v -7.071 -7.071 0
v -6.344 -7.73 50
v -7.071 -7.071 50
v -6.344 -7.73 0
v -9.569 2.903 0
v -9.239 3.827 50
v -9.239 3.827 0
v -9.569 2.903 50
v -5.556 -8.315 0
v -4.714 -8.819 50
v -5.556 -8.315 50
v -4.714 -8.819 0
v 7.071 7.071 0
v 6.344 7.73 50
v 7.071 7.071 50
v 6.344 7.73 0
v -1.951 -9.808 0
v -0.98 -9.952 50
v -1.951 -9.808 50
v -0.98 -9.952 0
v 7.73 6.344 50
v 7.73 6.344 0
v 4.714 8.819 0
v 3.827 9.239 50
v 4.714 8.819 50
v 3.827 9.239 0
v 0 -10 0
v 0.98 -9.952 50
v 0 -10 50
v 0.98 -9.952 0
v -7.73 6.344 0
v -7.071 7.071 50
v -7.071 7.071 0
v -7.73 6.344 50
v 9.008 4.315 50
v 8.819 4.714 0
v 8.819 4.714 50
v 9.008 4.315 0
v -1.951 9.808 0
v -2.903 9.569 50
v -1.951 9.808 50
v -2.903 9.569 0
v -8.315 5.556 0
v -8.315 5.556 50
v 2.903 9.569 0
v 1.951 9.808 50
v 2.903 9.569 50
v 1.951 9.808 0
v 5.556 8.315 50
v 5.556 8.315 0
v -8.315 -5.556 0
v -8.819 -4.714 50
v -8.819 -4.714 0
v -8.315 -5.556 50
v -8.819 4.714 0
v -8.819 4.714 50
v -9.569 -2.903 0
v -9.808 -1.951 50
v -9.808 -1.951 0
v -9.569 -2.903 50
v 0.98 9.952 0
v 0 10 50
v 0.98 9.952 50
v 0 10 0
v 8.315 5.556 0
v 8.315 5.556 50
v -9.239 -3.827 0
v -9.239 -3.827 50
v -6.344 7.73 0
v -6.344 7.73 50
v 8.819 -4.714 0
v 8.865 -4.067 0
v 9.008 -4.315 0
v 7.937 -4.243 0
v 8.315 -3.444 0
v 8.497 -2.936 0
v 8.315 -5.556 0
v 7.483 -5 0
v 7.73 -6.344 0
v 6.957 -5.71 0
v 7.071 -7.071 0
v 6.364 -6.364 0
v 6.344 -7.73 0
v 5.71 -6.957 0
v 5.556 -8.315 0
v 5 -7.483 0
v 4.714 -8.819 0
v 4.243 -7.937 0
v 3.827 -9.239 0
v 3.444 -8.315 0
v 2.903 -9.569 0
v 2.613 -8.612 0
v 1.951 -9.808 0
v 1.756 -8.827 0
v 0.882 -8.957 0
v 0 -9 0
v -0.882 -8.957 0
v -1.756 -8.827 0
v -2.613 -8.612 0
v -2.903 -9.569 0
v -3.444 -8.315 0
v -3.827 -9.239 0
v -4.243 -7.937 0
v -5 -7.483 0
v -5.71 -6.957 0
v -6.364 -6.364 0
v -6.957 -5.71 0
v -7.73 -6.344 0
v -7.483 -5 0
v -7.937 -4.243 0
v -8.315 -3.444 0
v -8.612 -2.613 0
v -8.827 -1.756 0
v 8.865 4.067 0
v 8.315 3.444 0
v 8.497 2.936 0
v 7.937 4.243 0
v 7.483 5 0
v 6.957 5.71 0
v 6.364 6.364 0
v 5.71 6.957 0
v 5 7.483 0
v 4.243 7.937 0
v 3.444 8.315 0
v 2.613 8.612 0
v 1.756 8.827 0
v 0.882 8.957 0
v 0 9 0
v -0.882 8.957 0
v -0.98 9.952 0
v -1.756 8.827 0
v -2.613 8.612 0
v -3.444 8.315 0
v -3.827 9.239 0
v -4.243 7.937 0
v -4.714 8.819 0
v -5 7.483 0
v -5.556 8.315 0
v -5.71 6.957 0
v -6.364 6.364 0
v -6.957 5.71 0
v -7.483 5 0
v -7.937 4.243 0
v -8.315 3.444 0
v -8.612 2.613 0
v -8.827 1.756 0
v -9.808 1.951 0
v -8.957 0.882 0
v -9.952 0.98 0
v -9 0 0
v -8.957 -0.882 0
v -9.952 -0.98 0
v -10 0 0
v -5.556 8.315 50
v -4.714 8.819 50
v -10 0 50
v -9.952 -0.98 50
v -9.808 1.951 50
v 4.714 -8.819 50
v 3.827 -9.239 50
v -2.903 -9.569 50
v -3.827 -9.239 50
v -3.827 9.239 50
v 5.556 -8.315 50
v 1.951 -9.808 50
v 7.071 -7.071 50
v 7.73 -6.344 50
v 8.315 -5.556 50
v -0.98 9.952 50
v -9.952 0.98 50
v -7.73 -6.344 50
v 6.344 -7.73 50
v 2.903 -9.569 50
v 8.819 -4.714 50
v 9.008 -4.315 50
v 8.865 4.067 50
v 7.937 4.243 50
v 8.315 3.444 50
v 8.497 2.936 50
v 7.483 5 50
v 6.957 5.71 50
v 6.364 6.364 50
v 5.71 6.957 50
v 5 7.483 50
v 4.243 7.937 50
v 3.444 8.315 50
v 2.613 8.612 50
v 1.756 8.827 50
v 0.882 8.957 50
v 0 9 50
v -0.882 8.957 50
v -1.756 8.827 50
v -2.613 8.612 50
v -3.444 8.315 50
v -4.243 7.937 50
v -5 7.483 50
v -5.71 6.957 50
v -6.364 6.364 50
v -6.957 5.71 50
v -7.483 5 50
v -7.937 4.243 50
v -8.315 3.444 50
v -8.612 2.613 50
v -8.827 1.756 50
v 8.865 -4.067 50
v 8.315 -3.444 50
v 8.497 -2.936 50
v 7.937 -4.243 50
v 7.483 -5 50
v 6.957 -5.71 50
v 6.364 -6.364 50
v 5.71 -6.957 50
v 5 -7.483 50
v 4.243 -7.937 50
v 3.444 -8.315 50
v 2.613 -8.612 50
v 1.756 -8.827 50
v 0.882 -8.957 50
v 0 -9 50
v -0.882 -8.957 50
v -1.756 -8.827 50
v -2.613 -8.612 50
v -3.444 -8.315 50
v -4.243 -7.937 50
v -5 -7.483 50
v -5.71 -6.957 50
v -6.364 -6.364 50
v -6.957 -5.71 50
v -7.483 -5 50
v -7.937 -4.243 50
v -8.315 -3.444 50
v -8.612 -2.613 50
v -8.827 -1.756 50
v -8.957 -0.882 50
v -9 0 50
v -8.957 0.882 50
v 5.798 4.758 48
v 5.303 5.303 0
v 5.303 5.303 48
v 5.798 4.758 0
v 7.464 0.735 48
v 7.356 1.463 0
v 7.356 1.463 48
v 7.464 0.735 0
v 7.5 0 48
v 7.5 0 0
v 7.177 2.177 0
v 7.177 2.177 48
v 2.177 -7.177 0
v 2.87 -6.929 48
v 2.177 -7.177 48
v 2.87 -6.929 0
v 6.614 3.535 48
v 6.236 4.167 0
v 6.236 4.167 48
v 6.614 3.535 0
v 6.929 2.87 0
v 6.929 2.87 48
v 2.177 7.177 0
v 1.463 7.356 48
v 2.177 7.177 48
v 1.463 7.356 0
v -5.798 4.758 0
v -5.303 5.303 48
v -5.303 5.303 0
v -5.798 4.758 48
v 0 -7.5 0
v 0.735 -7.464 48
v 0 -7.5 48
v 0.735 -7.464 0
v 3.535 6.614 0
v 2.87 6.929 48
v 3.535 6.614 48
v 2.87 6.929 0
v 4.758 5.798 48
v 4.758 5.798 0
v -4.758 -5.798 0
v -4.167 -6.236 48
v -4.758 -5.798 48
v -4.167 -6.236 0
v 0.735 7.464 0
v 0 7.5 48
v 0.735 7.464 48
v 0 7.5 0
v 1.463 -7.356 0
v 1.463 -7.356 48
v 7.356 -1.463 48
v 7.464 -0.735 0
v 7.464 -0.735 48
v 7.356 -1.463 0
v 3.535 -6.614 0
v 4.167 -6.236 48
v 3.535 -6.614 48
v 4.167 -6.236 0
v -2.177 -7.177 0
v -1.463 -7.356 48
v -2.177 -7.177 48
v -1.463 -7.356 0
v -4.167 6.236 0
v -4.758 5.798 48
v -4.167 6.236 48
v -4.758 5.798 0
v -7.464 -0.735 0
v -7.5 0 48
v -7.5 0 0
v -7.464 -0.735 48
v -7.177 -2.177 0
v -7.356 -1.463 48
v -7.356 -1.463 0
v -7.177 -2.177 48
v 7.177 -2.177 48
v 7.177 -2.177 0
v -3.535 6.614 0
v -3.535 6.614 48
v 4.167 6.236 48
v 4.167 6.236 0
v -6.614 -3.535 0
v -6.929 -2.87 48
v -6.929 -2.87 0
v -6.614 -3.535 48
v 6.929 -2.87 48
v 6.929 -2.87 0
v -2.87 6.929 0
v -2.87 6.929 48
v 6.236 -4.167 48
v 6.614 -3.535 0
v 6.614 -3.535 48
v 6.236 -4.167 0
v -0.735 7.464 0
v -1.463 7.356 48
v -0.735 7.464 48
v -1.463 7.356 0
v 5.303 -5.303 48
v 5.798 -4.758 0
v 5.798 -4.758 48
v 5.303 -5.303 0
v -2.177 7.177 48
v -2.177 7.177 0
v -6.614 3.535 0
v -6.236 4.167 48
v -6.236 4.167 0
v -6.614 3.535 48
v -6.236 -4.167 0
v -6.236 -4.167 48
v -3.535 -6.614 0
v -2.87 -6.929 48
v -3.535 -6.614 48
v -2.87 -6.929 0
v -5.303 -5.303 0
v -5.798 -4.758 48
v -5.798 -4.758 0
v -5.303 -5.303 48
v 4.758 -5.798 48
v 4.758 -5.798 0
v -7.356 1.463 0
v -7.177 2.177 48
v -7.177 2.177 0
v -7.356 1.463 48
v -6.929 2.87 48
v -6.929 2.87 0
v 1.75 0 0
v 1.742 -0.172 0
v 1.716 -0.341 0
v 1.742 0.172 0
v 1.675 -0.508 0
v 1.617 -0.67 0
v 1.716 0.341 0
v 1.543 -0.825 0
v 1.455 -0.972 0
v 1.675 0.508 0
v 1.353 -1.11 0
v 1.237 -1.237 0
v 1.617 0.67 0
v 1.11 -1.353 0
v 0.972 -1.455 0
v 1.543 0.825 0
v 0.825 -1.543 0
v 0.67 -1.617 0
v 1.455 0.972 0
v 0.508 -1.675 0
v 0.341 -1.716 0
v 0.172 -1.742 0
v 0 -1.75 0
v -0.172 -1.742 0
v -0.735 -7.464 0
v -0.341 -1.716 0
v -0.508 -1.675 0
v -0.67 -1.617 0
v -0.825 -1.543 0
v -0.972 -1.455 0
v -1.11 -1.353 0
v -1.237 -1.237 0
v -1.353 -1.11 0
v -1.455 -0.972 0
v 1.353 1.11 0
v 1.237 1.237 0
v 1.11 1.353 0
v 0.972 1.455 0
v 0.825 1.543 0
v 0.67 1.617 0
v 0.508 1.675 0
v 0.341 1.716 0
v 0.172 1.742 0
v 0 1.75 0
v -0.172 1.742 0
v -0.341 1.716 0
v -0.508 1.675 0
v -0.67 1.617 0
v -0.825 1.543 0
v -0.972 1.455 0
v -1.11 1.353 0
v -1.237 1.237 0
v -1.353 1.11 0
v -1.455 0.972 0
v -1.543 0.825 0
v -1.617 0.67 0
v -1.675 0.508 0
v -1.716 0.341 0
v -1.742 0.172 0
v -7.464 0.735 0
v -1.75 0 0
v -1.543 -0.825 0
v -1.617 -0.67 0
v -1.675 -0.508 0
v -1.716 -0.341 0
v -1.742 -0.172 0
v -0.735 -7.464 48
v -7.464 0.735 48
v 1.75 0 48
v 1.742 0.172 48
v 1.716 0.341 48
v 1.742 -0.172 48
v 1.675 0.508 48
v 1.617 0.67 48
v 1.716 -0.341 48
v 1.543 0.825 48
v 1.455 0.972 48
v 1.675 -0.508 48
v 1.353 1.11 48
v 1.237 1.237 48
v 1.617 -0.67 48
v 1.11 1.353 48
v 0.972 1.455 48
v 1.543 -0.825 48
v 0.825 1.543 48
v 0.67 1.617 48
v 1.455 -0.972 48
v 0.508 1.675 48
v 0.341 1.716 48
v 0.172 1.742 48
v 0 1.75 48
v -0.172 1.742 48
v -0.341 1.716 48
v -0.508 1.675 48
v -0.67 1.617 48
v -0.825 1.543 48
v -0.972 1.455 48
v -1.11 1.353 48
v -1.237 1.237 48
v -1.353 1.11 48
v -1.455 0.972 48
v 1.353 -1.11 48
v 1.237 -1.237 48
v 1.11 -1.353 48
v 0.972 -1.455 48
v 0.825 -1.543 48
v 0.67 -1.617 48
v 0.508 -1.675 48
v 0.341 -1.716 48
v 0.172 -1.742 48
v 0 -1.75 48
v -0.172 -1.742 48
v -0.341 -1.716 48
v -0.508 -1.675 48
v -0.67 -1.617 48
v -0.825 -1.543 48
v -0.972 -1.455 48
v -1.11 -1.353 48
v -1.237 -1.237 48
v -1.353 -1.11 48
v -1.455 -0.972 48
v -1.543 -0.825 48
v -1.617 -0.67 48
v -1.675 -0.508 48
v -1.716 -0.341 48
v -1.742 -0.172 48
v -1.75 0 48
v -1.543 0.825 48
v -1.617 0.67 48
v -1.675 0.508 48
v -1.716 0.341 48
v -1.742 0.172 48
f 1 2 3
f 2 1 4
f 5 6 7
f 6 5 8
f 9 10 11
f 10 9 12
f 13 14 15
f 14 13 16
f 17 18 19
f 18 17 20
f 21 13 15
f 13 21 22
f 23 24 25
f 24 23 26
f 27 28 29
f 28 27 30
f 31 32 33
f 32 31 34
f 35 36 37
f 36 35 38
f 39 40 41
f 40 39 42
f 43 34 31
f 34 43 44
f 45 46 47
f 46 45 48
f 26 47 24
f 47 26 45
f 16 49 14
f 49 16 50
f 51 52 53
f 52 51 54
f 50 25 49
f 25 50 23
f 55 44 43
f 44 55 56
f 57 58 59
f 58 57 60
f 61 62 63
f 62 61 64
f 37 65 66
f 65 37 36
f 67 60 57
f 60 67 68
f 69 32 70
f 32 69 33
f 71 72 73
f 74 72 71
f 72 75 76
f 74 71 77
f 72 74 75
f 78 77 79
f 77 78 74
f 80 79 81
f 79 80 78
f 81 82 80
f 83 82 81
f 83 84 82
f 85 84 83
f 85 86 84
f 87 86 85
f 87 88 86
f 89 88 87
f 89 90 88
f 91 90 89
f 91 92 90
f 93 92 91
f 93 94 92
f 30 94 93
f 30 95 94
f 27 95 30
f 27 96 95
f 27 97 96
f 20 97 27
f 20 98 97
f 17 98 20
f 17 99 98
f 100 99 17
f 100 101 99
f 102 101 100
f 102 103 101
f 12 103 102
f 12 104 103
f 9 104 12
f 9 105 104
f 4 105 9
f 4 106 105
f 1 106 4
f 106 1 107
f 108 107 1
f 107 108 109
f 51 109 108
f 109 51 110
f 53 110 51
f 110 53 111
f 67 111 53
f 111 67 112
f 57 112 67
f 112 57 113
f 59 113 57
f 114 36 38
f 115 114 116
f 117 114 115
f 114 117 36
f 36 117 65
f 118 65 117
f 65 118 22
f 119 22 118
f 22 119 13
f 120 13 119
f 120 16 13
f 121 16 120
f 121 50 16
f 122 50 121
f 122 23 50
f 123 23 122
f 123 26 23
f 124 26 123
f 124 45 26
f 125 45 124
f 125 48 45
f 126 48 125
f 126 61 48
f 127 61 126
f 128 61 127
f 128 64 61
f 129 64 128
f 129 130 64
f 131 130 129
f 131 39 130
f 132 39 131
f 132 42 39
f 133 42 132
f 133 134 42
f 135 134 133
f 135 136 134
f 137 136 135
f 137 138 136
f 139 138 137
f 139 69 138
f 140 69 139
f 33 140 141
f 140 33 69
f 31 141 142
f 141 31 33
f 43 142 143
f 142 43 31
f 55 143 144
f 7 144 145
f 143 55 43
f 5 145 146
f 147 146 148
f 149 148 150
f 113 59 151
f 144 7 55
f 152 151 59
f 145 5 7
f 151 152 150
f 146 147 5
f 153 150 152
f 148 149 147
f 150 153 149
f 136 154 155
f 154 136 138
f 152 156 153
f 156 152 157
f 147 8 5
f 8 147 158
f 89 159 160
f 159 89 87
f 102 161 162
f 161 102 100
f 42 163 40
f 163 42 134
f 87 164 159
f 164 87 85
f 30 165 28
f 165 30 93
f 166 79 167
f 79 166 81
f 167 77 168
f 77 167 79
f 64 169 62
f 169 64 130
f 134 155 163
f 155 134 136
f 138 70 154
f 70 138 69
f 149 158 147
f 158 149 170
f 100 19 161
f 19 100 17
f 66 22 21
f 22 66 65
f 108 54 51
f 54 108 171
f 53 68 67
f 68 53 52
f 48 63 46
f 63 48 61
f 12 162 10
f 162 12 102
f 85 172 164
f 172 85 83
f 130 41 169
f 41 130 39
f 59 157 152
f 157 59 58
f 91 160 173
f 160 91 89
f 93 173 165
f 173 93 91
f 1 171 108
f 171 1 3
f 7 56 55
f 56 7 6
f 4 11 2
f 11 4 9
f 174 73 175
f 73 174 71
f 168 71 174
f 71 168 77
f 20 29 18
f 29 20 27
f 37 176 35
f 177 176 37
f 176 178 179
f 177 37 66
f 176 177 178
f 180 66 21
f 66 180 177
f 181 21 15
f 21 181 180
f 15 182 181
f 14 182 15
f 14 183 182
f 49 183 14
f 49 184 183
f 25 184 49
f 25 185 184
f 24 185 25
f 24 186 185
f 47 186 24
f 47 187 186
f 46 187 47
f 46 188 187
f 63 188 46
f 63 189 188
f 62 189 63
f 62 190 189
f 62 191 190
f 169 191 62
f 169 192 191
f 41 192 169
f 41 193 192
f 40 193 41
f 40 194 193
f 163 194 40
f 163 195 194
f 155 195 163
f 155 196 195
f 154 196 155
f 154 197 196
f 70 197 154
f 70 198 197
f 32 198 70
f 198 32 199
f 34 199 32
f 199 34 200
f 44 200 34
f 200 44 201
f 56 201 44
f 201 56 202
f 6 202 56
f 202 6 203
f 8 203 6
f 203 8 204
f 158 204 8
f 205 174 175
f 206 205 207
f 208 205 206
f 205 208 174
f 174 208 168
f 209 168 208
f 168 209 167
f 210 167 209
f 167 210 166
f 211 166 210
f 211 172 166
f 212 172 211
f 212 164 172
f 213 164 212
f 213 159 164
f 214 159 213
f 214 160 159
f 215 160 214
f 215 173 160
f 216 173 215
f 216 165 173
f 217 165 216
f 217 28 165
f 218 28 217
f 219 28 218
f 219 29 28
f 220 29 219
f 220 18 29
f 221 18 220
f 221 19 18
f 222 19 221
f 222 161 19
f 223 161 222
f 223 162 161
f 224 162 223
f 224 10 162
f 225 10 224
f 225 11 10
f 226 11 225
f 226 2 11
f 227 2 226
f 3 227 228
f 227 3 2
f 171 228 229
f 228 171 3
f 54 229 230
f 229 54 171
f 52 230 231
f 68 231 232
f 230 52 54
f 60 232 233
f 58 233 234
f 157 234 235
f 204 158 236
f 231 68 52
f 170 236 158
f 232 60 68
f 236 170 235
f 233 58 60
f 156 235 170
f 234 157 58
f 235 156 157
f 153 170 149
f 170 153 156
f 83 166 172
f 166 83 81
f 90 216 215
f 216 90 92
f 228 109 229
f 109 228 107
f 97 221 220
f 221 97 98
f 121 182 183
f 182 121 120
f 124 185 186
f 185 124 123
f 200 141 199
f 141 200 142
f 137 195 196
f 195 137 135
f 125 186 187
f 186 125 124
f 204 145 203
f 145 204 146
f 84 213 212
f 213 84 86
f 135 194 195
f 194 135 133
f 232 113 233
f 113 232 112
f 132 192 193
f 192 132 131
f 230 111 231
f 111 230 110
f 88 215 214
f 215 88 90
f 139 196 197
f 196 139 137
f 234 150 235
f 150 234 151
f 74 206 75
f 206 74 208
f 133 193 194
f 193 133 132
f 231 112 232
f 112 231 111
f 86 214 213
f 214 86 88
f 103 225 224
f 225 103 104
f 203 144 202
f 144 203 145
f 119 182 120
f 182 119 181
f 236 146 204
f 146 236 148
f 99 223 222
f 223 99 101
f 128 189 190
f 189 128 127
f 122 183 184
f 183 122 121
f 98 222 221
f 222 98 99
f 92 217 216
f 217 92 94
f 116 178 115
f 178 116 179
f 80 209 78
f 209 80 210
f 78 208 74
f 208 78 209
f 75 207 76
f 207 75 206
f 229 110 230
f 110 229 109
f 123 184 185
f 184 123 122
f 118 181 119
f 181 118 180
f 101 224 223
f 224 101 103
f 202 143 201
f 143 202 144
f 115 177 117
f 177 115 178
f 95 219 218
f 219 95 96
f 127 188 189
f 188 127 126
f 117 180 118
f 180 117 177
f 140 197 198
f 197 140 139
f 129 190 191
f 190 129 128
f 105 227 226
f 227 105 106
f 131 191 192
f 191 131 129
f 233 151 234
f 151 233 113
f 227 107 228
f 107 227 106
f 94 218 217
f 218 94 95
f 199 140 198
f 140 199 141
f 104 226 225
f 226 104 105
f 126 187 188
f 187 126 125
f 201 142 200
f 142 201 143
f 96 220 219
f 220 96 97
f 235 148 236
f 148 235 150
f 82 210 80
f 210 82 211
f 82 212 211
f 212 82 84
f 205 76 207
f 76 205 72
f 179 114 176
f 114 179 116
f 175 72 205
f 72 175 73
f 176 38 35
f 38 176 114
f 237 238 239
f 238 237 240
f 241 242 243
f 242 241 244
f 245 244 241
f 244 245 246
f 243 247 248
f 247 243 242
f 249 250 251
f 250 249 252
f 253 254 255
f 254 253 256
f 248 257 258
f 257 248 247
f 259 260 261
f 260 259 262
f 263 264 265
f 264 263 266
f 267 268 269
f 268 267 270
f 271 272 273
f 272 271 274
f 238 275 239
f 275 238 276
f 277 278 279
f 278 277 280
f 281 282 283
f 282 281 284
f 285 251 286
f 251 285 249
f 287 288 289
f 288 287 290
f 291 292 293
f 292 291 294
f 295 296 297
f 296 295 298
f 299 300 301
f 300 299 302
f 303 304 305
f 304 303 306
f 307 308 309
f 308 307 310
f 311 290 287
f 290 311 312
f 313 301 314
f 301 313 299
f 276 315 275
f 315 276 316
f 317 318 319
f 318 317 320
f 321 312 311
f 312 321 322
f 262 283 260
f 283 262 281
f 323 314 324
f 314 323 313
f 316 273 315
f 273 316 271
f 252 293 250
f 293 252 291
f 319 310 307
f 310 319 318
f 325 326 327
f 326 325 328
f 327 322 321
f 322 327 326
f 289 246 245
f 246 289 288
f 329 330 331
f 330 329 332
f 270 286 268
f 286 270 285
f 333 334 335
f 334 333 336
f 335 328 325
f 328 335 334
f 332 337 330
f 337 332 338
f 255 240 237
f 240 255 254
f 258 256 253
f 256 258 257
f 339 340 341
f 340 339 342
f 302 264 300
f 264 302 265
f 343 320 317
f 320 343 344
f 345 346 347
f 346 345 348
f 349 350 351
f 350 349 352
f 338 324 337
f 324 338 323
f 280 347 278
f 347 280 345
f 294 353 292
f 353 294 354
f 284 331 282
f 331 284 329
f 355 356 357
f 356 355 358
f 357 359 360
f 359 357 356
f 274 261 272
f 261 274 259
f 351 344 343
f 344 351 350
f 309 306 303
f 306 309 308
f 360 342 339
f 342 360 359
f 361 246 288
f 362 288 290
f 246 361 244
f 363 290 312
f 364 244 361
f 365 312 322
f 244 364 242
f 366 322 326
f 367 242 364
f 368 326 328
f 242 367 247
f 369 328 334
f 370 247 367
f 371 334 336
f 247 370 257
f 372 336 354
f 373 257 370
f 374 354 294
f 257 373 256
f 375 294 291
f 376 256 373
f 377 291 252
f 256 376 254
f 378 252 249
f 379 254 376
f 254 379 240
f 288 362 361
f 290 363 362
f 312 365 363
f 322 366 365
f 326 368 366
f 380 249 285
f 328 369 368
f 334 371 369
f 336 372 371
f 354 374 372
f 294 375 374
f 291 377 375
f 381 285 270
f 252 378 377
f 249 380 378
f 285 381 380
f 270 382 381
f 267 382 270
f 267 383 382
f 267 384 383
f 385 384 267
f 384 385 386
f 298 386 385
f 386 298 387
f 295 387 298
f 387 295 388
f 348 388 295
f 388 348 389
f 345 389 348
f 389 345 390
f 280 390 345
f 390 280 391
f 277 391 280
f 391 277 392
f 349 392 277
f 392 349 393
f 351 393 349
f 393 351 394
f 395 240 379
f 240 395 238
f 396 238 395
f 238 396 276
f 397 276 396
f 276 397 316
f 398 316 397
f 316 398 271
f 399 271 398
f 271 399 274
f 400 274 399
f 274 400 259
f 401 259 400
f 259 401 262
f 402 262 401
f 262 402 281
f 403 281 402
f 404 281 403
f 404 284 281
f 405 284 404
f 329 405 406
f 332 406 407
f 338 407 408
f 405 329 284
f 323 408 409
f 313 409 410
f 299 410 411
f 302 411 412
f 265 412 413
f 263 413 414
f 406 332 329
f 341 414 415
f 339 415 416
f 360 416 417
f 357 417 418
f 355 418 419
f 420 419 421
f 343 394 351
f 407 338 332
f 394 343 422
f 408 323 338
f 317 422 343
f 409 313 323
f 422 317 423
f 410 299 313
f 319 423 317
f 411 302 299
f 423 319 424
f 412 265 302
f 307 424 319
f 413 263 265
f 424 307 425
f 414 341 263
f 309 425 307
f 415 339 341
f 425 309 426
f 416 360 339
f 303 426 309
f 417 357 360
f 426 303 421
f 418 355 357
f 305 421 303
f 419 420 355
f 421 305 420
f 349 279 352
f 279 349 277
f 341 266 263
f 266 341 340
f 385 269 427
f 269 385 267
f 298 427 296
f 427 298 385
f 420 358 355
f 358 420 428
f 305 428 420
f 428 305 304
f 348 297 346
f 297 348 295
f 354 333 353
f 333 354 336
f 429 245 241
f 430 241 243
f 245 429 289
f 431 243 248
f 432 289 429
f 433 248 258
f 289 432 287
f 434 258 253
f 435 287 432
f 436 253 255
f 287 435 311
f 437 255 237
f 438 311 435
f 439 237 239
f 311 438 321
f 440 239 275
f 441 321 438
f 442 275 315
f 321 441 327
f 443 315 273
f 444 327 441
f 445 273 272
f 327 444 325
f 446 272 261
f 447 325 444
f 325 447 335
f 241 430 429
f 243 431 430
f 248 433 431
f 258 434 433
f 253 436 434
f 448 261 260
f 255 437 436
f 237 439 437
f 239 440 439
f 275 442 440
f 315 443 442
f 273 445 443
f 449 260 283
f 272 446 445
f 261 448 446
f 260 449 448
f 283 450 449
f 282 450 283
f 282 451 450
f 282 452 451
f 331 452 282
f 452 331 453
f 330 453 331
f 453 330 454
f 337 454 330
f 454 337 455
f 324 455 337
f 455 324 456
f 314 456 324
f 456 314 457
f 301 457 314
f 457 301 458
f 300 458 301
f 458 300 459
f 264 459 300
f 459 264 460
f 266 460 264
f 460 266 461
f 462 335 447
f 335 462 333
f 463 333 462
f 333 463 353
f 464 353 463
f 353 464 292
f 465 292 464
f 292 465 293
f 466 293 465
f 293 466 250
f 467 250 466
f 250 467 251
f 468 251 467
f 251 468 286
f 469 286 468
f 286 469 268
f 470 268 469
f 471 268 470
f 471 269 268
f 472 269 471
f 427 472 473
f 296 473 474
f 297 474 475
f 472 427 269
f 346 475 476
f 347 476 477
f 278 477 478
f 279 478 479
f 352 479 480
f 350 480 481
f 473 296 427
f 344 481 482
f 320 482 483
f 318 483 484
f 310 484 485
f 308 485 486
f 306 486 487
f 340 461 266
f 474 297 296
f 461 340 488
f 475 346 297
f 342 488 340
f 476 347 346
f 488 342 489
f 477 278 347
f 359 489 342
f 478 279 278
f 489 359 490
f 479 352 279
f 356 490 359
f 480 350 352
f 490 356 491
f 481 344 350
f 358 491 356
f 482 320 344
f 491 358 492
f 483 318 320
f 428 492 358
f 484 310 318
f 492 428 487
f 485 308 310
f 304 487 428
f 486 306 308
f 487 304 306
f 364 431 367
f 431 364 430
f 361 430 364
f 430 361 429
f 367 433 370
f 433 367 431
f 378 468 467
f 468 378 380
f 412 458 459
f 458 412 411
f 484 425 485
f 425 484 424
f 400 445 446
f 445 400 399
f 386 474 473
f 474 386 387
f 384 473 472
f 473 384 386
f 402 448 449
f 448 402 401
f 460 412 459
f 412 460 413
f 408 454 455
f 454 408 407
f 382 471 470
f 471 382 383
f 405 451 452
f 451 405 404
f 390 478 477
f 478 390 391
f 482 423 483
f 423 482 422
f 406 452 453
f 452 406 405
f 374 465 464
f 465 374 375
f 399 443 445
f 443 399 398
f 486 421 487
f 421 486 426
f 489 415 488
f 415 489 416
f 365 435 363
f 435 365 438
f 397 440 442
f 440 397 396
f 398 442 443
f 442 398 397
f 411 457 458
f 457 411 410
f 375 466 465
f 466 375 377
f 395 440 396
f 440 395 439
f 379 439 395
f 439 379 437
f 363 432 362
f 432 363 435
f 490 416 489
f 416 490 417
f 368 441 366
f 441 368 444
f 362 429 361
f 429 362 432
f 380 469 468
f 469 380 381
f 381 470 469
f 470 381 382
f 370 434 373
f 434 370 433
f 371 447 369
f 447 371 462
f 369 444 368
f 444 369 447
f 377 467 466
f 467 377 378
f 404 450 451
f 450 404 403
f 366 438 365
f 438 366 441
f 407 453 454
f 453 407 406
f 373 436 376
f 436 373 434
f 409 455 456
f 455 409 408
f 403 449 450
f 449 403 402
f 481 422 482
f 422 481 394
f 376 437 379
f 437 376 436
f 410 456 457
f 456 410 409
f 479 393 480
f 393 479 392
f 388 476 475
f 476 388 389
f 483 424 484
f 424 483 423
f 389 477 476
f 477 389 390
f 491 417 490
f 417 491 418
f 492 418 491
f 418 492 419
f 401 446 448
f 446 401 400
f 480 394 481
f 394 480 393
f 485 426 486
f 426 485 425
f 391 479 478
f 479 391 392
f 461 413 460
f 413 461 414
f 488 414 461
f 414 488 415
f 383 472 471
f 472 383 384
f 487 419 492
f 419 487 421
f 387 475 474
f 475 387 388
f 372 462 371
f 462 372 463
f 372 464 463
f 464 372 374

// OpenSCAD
module pipe( od, id, h ) {
	difference() {
		cylinder( r=od/2, h=h, $fn=64 );
		translate( [0,0,-1] ) cylinder( r=id/2, h=h+2, $fn=64 );
	}
}

od = 20;
id = 18;
l = 50;

difference() {
	union() {	

		// Sheath
		difference() {
			pipe( od, id, l );
			translate( [od-(od-id),0,-1] ) cylinder( r=od/2, h=l+2 );
		}
		
		// Roller
		translate( [0,0,0] ) cylinder( r=(id/2)-1.5, h=l-2, $fn=64 );

		// Ends
//		translate( [-od/2-1,-od/2-1,-2] ) cube( [ od+2,od+2,3] );

		// Cups
//		pipe( od+2, od+0.3, 5 );
	}

	// Axle
	translate( [0,0,-3] ) cylinder( r=3.5/2, h=l+10, $fn=64 );
}
